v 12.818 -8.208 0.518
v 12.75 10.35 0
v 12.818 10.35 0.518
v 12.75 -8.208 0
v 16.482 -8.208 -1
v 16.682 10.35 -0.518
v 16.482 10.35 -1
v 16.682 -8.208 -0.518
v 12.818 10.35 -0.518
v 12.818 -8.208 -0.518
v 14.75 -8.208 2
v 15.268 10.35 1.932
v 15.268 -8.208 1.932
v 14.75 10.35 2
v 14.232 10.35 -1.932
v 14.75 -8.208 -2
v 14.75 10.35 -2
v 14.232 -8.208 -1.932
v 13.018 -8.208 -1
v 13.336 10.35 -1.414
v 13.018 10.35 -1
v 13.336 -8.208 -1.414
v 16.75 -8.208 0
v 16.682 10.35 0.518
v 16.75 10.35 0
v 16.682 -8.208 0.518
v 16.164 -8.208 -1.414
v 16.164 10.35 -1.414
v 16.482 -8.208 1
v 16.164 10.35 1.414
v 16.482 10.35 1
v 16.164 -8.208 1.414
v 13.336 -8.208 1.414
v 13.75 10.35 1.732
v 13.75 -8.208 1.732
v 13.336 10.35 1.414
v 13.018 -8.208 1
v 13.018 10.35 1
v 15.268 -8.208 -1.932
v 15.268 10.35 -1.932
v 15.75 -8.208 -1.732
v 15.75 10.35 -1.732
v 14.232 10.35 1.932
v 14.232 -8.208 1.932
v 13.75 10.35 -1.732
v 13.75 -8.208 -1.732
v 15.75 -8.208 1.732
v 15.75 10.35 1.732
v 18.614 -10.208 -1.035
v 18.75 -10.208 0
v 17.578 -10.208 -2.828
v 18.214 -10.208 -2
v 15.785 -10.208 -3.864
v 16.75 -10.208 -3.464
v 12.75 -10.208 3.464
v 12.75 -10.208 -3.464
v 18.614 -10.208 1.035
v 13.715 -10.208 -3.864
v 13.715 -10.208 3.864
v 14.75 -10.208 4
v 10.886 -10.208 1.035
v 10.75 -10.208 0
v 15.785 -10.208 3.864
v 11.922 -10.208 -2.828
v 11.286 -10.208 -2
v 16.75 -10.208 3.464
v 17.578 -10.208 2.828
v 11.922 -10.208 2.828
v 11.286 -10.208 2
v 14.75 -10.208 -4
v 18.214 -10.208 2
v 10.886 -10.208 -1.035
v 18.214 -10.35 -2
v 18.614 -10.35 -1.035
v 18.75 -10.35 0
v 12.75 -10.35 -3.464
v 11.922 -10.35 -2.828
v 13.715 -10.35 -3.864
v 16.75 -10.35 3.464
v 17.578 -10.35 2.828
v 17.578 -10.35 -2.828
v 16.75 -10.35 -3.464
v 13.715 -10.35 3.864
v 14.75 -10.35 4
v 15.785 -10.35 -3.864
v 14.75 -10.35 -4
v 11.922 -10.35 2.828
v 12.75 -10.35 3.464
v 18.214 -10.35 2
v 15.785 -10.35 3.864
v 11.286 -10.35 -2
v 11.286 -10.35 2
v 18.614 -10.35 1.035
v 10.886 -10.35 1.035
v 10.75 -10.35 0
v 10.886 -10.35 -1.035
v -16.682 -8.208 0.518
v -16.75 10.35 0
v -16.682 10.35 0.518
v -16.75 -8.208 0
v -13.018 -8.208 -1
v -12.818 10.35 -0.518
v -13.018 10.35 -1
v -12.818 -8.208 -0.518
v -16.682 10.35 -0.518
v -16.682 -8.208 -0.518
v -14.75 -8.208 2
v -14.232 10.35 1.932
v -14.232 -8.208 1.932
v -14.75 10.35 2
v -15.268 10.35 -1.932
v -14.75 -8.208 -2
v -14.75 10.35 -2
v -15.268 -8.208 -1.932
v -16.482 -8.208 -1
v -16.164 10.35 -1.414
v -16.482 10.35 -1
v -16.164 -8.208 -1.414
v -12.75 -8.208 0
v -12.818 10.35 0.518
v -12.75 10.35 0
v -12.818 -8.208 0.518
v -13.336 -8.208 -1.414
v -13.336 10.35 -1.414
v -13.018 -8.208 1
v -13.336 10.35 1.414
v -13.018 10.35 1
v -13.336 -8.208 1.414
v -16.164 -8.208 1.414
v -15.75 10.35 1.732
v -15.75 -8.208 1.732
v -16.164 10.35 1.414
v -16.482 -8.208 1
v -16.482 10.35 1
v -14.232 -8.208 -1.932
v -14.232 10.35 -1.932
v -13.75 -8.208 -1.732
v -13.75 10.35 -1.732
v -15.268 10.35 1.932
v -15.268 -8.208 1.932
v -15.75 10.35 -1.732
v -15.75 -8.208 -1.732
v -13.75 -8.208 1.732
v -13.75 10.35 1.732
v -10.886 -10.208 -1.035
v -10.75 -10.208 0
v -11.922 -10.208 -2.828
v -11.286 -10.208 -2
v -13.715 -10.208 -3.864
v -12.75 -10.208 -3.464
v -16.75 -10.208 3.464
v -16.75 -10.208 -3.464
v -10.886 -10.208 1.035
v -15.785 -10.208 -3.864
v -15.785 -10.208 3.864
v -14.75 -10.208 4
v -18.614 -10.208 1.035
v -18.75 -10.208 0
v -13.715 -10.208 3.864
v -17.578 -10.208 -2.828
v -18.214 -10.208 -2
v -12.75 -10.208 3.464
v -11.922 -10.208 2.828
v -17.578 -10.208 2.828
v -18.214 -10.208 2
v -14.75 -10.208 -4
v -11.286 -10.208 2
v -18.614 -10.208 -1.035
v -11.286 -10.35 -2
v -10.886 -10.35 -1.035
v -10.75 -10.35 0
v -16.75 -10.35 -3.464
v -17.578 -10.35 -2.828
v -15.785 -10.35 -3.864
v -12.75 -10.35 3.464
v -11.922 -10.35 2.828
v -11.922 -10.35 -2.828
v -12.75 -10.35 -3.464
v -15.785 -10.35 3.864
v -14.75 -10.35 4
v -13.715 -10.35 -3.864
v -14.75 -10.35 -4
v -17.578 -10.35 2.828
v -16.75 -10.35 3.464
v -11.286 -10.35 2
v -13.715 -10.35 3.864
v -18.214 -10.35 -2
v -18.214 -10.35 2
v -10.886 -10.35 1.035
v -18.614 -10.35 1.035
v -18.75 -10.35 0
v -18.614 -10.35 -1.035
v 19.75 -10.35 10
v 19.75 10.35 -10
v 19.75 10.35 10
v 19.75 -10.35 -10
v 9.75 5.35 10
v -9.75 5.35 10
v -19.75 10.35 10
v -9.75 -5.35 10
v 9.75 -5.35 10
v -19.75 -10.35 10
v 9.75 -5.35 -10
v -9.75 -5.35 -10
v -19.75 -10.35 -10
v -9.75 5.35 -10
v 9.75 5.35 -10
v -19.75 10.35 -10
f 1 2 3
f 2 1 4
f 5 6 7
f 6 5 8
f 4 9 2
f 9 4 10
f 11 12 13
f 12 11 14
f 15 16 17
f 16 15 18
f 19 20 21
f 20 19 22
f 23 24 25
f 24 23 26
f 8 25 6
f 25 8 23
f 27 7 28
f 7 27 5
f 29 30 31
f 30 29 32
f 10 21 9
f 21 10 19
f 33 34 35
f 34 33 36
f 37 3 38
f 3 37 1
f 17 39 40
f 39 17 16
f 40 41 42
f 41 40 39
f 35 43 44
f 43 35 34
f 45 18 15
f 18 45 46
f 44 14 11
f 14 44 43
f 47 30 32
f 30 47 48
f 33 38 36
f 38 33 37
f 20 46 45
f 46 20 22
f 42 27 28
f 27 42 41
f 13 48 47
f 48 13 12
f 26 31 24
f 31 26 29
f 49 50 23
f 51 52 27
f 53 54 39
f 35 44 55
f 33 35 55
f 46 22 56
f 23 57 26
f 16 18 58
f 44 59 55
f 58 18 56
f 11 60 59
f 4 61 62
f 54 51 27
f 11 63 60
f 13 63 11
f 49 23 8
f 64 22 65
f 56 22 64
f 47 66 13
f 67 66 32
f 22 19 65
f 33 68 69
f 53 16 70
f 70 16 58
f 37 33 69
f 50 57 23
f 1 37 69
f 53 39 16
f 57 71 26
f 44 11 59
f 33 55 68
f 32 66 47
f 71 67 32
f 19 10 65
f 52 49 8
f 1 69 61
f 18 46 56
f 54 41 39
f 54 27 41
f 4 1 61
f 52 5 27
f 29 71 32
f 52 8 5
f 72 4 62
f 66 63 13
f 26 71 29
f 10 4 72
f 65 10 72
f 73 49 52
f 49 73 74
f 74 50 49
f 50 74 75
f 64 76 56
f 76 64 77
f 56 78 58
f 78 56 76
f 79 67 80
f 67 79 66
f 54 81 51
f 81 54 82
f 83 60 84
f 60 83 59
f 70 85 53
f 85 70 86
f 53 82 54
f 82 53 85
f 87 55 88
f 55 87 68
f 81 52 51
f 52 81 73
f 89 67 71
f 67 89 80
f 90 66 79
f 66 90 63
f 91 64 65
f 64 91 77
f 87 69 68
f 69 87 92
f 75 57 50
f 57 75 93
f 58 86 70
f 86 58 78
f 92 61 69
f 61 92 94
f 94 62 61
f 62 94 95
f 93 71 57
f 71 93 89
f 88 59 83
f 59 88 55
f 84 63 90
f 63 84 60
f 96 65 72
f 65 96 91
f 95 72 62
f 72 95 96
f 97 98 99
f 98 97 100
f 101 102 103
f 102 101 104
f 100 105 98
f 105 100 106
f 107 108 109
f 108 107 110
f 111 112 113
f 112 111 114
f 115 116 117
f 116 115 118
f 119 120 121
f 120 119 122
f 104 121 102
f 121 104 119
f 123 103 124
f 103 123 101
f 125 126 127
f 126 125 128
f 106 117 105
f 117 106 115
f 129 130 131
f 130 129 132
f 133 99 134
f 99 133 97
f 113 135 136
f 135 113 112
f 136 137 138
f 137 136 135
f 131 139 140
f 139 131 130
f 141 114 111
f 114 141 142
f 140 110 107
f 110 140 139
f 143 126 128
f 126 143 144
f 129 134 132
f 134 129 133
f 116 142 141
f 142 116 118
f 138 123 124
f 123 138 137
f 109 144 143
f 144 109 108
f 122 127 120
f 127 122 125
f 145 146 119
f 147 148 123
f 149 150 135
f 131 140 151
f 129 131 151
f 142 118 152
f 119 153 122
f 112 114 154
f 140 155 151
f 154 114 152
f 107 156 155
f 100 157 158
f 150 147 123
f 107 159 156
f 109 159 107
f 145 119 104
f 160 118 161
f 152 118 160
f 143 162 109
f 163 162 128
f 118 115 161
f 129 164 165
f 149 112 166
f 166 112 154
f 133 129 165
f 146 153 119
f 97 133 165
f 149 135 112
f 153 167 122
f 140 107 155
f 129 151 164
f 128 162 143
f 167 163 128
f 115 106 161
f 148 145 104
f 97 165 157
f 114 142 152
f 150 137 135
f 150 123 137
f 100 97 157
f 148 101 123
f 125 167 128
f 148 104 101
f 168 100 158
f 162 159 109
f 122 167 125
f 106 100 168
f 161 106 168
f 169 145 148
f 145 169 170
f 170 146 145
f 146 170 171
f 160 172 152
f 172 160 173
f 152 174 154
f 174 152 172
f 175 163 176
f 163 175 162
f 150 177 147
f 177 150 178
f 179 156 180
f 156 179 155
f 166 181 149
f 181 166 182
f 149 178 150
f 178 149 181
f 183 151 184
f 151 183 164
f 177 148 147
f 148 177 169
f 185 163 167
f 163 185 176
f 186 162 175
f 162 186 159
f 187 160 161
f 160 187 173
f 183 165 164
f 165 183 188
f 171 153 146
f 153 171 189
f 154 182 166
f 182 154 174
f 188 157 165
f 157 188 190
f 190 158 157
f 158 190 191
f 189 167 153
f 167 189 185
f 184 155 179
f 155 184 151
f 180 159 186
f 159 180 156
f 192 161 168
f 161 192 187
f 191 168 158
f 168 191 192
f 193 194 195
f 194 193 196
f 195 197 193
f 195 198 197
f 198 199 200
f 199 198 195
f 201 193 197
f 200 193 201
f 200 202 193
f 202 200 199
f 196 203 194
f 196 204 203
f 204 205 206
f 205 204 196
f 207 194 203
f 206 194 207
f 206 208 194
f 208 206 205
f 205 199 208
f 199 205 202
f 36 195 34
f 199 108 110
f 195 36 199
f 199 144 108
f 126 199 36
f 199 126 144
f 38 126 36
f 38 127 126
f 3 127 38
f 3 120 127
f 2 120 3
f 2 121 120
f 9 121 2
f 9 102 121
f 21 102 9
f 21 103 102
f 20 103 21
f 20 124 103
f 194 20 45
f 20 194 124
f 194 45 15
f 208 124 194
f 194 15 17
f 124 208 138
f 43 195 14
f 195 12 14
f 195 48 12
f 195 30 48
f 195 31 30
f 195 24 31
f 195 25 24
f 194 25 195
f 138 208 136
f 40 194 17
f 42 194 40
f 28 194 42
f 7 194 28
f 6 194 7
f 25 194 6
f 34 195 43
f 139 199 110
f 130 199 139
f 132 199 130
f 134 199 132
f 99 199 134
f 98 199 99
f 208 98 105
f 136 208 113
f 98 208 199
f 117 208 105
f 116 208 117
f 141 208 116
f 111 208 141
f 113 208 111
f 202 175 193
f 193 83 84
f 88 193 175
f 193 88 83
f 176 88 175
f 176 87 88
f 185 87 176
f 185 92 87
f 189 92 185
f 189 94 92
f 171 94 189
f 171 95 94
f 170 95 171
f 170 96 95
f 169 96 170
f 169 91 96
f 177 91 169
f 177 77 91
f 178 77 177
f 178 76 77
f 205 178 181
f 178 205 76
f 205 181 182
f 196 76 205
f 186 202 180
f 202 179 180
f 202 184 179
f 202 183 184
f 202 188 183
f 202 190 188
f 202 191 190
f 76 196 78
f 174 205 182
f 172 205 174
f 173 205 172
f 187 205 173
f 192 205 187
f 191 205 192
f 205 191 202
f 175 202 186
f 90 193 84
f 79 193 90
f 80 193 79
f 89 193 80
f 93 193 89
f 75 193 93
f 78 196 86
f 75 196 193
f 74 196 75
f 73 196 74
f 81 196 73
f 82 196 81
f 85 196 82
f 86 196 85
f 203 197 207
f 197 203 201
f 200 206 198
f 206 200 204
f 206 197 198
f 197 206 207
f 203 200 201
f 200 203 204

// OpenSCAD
// Wire strippers (second type) holder 3D Design

// Copyright (c) 2014 by Jeremy Bennett <jeremy.bennett@embecosm.com>

// Crimp holder 3D Design is licensed under a Creative Commons
// Attribution-ShareAlike 3.0 Unported License.

// You should have received a copy of the license along with this work.  If not,
// see <http://creativecommons.org/licenses/by-sa/3.0/>.

// -----------------------------------------------------------------------------


use <MCAD/regular_shapes.scad>


// A screw hole with a countersink
module screwhole (bore, length) {
	iota = length / 100;
	half_length = length / 2 + iota;
	full_length = half_length * 2;
	union () {
		cylinder (r = bore / 2, h = full_length, center = true, $fn = 24);
		translate (v = [0, 0, -half_length + bore / 4 + bore / 10])
			cylinder (r1 = bore, r2 = bore / 2, h = bore / 2, center = true, $fn = 24);
		translate (v = [0, 0, -half_length + bore / 20])
			cylinder (r = bore, h = bore / 10, center = true, $fn = 24);
	}
}


// A screw hole for a screw parallel with the Y axis
module screwhole_y (bore, length, x_off, z_off) {
	translate (v = [x_off, 0, z_off])
		rotate (a = [-90, 0, 0])
			screwhole (bore = bore, length = length);
}


// Crimp support with screwholes
module long_nose_support () {
	back_thickness = 5;
	front_thickness = 5;
	side_thickness = 10;
	hole_width = 19.5;
	hole_depth = 10.7;
	block_width = hole_width + side_thickness * 2;
	block_depth = hole_depth + back_thickness + front_thickness;
	height = 20;
	screw_x_off = (hole_width + side_thickness) / 2;
	screw_z_off = 0;
	iota = 0.1;
	difference () {
		cube (size = [block_width, block_depth, height], center = true);
		// hole for strippers
		translate (v = [0, (back_thickness - front_thickness) / 2, 0])
			cube (size = [ hole_width, hole_depth, height + iota], center = true);
		// screw_holes
		screwhole_y (bore = 4, length = block_depth + iota, x_off =  screw_x_off,
		             z_off = screw_z_off);
		screwhole_y (bore = 4, length = block_depth + iota, x_off = -screw_x_off,
		             z_off = screw_z_off);
	}
}


long_nose_support ();
